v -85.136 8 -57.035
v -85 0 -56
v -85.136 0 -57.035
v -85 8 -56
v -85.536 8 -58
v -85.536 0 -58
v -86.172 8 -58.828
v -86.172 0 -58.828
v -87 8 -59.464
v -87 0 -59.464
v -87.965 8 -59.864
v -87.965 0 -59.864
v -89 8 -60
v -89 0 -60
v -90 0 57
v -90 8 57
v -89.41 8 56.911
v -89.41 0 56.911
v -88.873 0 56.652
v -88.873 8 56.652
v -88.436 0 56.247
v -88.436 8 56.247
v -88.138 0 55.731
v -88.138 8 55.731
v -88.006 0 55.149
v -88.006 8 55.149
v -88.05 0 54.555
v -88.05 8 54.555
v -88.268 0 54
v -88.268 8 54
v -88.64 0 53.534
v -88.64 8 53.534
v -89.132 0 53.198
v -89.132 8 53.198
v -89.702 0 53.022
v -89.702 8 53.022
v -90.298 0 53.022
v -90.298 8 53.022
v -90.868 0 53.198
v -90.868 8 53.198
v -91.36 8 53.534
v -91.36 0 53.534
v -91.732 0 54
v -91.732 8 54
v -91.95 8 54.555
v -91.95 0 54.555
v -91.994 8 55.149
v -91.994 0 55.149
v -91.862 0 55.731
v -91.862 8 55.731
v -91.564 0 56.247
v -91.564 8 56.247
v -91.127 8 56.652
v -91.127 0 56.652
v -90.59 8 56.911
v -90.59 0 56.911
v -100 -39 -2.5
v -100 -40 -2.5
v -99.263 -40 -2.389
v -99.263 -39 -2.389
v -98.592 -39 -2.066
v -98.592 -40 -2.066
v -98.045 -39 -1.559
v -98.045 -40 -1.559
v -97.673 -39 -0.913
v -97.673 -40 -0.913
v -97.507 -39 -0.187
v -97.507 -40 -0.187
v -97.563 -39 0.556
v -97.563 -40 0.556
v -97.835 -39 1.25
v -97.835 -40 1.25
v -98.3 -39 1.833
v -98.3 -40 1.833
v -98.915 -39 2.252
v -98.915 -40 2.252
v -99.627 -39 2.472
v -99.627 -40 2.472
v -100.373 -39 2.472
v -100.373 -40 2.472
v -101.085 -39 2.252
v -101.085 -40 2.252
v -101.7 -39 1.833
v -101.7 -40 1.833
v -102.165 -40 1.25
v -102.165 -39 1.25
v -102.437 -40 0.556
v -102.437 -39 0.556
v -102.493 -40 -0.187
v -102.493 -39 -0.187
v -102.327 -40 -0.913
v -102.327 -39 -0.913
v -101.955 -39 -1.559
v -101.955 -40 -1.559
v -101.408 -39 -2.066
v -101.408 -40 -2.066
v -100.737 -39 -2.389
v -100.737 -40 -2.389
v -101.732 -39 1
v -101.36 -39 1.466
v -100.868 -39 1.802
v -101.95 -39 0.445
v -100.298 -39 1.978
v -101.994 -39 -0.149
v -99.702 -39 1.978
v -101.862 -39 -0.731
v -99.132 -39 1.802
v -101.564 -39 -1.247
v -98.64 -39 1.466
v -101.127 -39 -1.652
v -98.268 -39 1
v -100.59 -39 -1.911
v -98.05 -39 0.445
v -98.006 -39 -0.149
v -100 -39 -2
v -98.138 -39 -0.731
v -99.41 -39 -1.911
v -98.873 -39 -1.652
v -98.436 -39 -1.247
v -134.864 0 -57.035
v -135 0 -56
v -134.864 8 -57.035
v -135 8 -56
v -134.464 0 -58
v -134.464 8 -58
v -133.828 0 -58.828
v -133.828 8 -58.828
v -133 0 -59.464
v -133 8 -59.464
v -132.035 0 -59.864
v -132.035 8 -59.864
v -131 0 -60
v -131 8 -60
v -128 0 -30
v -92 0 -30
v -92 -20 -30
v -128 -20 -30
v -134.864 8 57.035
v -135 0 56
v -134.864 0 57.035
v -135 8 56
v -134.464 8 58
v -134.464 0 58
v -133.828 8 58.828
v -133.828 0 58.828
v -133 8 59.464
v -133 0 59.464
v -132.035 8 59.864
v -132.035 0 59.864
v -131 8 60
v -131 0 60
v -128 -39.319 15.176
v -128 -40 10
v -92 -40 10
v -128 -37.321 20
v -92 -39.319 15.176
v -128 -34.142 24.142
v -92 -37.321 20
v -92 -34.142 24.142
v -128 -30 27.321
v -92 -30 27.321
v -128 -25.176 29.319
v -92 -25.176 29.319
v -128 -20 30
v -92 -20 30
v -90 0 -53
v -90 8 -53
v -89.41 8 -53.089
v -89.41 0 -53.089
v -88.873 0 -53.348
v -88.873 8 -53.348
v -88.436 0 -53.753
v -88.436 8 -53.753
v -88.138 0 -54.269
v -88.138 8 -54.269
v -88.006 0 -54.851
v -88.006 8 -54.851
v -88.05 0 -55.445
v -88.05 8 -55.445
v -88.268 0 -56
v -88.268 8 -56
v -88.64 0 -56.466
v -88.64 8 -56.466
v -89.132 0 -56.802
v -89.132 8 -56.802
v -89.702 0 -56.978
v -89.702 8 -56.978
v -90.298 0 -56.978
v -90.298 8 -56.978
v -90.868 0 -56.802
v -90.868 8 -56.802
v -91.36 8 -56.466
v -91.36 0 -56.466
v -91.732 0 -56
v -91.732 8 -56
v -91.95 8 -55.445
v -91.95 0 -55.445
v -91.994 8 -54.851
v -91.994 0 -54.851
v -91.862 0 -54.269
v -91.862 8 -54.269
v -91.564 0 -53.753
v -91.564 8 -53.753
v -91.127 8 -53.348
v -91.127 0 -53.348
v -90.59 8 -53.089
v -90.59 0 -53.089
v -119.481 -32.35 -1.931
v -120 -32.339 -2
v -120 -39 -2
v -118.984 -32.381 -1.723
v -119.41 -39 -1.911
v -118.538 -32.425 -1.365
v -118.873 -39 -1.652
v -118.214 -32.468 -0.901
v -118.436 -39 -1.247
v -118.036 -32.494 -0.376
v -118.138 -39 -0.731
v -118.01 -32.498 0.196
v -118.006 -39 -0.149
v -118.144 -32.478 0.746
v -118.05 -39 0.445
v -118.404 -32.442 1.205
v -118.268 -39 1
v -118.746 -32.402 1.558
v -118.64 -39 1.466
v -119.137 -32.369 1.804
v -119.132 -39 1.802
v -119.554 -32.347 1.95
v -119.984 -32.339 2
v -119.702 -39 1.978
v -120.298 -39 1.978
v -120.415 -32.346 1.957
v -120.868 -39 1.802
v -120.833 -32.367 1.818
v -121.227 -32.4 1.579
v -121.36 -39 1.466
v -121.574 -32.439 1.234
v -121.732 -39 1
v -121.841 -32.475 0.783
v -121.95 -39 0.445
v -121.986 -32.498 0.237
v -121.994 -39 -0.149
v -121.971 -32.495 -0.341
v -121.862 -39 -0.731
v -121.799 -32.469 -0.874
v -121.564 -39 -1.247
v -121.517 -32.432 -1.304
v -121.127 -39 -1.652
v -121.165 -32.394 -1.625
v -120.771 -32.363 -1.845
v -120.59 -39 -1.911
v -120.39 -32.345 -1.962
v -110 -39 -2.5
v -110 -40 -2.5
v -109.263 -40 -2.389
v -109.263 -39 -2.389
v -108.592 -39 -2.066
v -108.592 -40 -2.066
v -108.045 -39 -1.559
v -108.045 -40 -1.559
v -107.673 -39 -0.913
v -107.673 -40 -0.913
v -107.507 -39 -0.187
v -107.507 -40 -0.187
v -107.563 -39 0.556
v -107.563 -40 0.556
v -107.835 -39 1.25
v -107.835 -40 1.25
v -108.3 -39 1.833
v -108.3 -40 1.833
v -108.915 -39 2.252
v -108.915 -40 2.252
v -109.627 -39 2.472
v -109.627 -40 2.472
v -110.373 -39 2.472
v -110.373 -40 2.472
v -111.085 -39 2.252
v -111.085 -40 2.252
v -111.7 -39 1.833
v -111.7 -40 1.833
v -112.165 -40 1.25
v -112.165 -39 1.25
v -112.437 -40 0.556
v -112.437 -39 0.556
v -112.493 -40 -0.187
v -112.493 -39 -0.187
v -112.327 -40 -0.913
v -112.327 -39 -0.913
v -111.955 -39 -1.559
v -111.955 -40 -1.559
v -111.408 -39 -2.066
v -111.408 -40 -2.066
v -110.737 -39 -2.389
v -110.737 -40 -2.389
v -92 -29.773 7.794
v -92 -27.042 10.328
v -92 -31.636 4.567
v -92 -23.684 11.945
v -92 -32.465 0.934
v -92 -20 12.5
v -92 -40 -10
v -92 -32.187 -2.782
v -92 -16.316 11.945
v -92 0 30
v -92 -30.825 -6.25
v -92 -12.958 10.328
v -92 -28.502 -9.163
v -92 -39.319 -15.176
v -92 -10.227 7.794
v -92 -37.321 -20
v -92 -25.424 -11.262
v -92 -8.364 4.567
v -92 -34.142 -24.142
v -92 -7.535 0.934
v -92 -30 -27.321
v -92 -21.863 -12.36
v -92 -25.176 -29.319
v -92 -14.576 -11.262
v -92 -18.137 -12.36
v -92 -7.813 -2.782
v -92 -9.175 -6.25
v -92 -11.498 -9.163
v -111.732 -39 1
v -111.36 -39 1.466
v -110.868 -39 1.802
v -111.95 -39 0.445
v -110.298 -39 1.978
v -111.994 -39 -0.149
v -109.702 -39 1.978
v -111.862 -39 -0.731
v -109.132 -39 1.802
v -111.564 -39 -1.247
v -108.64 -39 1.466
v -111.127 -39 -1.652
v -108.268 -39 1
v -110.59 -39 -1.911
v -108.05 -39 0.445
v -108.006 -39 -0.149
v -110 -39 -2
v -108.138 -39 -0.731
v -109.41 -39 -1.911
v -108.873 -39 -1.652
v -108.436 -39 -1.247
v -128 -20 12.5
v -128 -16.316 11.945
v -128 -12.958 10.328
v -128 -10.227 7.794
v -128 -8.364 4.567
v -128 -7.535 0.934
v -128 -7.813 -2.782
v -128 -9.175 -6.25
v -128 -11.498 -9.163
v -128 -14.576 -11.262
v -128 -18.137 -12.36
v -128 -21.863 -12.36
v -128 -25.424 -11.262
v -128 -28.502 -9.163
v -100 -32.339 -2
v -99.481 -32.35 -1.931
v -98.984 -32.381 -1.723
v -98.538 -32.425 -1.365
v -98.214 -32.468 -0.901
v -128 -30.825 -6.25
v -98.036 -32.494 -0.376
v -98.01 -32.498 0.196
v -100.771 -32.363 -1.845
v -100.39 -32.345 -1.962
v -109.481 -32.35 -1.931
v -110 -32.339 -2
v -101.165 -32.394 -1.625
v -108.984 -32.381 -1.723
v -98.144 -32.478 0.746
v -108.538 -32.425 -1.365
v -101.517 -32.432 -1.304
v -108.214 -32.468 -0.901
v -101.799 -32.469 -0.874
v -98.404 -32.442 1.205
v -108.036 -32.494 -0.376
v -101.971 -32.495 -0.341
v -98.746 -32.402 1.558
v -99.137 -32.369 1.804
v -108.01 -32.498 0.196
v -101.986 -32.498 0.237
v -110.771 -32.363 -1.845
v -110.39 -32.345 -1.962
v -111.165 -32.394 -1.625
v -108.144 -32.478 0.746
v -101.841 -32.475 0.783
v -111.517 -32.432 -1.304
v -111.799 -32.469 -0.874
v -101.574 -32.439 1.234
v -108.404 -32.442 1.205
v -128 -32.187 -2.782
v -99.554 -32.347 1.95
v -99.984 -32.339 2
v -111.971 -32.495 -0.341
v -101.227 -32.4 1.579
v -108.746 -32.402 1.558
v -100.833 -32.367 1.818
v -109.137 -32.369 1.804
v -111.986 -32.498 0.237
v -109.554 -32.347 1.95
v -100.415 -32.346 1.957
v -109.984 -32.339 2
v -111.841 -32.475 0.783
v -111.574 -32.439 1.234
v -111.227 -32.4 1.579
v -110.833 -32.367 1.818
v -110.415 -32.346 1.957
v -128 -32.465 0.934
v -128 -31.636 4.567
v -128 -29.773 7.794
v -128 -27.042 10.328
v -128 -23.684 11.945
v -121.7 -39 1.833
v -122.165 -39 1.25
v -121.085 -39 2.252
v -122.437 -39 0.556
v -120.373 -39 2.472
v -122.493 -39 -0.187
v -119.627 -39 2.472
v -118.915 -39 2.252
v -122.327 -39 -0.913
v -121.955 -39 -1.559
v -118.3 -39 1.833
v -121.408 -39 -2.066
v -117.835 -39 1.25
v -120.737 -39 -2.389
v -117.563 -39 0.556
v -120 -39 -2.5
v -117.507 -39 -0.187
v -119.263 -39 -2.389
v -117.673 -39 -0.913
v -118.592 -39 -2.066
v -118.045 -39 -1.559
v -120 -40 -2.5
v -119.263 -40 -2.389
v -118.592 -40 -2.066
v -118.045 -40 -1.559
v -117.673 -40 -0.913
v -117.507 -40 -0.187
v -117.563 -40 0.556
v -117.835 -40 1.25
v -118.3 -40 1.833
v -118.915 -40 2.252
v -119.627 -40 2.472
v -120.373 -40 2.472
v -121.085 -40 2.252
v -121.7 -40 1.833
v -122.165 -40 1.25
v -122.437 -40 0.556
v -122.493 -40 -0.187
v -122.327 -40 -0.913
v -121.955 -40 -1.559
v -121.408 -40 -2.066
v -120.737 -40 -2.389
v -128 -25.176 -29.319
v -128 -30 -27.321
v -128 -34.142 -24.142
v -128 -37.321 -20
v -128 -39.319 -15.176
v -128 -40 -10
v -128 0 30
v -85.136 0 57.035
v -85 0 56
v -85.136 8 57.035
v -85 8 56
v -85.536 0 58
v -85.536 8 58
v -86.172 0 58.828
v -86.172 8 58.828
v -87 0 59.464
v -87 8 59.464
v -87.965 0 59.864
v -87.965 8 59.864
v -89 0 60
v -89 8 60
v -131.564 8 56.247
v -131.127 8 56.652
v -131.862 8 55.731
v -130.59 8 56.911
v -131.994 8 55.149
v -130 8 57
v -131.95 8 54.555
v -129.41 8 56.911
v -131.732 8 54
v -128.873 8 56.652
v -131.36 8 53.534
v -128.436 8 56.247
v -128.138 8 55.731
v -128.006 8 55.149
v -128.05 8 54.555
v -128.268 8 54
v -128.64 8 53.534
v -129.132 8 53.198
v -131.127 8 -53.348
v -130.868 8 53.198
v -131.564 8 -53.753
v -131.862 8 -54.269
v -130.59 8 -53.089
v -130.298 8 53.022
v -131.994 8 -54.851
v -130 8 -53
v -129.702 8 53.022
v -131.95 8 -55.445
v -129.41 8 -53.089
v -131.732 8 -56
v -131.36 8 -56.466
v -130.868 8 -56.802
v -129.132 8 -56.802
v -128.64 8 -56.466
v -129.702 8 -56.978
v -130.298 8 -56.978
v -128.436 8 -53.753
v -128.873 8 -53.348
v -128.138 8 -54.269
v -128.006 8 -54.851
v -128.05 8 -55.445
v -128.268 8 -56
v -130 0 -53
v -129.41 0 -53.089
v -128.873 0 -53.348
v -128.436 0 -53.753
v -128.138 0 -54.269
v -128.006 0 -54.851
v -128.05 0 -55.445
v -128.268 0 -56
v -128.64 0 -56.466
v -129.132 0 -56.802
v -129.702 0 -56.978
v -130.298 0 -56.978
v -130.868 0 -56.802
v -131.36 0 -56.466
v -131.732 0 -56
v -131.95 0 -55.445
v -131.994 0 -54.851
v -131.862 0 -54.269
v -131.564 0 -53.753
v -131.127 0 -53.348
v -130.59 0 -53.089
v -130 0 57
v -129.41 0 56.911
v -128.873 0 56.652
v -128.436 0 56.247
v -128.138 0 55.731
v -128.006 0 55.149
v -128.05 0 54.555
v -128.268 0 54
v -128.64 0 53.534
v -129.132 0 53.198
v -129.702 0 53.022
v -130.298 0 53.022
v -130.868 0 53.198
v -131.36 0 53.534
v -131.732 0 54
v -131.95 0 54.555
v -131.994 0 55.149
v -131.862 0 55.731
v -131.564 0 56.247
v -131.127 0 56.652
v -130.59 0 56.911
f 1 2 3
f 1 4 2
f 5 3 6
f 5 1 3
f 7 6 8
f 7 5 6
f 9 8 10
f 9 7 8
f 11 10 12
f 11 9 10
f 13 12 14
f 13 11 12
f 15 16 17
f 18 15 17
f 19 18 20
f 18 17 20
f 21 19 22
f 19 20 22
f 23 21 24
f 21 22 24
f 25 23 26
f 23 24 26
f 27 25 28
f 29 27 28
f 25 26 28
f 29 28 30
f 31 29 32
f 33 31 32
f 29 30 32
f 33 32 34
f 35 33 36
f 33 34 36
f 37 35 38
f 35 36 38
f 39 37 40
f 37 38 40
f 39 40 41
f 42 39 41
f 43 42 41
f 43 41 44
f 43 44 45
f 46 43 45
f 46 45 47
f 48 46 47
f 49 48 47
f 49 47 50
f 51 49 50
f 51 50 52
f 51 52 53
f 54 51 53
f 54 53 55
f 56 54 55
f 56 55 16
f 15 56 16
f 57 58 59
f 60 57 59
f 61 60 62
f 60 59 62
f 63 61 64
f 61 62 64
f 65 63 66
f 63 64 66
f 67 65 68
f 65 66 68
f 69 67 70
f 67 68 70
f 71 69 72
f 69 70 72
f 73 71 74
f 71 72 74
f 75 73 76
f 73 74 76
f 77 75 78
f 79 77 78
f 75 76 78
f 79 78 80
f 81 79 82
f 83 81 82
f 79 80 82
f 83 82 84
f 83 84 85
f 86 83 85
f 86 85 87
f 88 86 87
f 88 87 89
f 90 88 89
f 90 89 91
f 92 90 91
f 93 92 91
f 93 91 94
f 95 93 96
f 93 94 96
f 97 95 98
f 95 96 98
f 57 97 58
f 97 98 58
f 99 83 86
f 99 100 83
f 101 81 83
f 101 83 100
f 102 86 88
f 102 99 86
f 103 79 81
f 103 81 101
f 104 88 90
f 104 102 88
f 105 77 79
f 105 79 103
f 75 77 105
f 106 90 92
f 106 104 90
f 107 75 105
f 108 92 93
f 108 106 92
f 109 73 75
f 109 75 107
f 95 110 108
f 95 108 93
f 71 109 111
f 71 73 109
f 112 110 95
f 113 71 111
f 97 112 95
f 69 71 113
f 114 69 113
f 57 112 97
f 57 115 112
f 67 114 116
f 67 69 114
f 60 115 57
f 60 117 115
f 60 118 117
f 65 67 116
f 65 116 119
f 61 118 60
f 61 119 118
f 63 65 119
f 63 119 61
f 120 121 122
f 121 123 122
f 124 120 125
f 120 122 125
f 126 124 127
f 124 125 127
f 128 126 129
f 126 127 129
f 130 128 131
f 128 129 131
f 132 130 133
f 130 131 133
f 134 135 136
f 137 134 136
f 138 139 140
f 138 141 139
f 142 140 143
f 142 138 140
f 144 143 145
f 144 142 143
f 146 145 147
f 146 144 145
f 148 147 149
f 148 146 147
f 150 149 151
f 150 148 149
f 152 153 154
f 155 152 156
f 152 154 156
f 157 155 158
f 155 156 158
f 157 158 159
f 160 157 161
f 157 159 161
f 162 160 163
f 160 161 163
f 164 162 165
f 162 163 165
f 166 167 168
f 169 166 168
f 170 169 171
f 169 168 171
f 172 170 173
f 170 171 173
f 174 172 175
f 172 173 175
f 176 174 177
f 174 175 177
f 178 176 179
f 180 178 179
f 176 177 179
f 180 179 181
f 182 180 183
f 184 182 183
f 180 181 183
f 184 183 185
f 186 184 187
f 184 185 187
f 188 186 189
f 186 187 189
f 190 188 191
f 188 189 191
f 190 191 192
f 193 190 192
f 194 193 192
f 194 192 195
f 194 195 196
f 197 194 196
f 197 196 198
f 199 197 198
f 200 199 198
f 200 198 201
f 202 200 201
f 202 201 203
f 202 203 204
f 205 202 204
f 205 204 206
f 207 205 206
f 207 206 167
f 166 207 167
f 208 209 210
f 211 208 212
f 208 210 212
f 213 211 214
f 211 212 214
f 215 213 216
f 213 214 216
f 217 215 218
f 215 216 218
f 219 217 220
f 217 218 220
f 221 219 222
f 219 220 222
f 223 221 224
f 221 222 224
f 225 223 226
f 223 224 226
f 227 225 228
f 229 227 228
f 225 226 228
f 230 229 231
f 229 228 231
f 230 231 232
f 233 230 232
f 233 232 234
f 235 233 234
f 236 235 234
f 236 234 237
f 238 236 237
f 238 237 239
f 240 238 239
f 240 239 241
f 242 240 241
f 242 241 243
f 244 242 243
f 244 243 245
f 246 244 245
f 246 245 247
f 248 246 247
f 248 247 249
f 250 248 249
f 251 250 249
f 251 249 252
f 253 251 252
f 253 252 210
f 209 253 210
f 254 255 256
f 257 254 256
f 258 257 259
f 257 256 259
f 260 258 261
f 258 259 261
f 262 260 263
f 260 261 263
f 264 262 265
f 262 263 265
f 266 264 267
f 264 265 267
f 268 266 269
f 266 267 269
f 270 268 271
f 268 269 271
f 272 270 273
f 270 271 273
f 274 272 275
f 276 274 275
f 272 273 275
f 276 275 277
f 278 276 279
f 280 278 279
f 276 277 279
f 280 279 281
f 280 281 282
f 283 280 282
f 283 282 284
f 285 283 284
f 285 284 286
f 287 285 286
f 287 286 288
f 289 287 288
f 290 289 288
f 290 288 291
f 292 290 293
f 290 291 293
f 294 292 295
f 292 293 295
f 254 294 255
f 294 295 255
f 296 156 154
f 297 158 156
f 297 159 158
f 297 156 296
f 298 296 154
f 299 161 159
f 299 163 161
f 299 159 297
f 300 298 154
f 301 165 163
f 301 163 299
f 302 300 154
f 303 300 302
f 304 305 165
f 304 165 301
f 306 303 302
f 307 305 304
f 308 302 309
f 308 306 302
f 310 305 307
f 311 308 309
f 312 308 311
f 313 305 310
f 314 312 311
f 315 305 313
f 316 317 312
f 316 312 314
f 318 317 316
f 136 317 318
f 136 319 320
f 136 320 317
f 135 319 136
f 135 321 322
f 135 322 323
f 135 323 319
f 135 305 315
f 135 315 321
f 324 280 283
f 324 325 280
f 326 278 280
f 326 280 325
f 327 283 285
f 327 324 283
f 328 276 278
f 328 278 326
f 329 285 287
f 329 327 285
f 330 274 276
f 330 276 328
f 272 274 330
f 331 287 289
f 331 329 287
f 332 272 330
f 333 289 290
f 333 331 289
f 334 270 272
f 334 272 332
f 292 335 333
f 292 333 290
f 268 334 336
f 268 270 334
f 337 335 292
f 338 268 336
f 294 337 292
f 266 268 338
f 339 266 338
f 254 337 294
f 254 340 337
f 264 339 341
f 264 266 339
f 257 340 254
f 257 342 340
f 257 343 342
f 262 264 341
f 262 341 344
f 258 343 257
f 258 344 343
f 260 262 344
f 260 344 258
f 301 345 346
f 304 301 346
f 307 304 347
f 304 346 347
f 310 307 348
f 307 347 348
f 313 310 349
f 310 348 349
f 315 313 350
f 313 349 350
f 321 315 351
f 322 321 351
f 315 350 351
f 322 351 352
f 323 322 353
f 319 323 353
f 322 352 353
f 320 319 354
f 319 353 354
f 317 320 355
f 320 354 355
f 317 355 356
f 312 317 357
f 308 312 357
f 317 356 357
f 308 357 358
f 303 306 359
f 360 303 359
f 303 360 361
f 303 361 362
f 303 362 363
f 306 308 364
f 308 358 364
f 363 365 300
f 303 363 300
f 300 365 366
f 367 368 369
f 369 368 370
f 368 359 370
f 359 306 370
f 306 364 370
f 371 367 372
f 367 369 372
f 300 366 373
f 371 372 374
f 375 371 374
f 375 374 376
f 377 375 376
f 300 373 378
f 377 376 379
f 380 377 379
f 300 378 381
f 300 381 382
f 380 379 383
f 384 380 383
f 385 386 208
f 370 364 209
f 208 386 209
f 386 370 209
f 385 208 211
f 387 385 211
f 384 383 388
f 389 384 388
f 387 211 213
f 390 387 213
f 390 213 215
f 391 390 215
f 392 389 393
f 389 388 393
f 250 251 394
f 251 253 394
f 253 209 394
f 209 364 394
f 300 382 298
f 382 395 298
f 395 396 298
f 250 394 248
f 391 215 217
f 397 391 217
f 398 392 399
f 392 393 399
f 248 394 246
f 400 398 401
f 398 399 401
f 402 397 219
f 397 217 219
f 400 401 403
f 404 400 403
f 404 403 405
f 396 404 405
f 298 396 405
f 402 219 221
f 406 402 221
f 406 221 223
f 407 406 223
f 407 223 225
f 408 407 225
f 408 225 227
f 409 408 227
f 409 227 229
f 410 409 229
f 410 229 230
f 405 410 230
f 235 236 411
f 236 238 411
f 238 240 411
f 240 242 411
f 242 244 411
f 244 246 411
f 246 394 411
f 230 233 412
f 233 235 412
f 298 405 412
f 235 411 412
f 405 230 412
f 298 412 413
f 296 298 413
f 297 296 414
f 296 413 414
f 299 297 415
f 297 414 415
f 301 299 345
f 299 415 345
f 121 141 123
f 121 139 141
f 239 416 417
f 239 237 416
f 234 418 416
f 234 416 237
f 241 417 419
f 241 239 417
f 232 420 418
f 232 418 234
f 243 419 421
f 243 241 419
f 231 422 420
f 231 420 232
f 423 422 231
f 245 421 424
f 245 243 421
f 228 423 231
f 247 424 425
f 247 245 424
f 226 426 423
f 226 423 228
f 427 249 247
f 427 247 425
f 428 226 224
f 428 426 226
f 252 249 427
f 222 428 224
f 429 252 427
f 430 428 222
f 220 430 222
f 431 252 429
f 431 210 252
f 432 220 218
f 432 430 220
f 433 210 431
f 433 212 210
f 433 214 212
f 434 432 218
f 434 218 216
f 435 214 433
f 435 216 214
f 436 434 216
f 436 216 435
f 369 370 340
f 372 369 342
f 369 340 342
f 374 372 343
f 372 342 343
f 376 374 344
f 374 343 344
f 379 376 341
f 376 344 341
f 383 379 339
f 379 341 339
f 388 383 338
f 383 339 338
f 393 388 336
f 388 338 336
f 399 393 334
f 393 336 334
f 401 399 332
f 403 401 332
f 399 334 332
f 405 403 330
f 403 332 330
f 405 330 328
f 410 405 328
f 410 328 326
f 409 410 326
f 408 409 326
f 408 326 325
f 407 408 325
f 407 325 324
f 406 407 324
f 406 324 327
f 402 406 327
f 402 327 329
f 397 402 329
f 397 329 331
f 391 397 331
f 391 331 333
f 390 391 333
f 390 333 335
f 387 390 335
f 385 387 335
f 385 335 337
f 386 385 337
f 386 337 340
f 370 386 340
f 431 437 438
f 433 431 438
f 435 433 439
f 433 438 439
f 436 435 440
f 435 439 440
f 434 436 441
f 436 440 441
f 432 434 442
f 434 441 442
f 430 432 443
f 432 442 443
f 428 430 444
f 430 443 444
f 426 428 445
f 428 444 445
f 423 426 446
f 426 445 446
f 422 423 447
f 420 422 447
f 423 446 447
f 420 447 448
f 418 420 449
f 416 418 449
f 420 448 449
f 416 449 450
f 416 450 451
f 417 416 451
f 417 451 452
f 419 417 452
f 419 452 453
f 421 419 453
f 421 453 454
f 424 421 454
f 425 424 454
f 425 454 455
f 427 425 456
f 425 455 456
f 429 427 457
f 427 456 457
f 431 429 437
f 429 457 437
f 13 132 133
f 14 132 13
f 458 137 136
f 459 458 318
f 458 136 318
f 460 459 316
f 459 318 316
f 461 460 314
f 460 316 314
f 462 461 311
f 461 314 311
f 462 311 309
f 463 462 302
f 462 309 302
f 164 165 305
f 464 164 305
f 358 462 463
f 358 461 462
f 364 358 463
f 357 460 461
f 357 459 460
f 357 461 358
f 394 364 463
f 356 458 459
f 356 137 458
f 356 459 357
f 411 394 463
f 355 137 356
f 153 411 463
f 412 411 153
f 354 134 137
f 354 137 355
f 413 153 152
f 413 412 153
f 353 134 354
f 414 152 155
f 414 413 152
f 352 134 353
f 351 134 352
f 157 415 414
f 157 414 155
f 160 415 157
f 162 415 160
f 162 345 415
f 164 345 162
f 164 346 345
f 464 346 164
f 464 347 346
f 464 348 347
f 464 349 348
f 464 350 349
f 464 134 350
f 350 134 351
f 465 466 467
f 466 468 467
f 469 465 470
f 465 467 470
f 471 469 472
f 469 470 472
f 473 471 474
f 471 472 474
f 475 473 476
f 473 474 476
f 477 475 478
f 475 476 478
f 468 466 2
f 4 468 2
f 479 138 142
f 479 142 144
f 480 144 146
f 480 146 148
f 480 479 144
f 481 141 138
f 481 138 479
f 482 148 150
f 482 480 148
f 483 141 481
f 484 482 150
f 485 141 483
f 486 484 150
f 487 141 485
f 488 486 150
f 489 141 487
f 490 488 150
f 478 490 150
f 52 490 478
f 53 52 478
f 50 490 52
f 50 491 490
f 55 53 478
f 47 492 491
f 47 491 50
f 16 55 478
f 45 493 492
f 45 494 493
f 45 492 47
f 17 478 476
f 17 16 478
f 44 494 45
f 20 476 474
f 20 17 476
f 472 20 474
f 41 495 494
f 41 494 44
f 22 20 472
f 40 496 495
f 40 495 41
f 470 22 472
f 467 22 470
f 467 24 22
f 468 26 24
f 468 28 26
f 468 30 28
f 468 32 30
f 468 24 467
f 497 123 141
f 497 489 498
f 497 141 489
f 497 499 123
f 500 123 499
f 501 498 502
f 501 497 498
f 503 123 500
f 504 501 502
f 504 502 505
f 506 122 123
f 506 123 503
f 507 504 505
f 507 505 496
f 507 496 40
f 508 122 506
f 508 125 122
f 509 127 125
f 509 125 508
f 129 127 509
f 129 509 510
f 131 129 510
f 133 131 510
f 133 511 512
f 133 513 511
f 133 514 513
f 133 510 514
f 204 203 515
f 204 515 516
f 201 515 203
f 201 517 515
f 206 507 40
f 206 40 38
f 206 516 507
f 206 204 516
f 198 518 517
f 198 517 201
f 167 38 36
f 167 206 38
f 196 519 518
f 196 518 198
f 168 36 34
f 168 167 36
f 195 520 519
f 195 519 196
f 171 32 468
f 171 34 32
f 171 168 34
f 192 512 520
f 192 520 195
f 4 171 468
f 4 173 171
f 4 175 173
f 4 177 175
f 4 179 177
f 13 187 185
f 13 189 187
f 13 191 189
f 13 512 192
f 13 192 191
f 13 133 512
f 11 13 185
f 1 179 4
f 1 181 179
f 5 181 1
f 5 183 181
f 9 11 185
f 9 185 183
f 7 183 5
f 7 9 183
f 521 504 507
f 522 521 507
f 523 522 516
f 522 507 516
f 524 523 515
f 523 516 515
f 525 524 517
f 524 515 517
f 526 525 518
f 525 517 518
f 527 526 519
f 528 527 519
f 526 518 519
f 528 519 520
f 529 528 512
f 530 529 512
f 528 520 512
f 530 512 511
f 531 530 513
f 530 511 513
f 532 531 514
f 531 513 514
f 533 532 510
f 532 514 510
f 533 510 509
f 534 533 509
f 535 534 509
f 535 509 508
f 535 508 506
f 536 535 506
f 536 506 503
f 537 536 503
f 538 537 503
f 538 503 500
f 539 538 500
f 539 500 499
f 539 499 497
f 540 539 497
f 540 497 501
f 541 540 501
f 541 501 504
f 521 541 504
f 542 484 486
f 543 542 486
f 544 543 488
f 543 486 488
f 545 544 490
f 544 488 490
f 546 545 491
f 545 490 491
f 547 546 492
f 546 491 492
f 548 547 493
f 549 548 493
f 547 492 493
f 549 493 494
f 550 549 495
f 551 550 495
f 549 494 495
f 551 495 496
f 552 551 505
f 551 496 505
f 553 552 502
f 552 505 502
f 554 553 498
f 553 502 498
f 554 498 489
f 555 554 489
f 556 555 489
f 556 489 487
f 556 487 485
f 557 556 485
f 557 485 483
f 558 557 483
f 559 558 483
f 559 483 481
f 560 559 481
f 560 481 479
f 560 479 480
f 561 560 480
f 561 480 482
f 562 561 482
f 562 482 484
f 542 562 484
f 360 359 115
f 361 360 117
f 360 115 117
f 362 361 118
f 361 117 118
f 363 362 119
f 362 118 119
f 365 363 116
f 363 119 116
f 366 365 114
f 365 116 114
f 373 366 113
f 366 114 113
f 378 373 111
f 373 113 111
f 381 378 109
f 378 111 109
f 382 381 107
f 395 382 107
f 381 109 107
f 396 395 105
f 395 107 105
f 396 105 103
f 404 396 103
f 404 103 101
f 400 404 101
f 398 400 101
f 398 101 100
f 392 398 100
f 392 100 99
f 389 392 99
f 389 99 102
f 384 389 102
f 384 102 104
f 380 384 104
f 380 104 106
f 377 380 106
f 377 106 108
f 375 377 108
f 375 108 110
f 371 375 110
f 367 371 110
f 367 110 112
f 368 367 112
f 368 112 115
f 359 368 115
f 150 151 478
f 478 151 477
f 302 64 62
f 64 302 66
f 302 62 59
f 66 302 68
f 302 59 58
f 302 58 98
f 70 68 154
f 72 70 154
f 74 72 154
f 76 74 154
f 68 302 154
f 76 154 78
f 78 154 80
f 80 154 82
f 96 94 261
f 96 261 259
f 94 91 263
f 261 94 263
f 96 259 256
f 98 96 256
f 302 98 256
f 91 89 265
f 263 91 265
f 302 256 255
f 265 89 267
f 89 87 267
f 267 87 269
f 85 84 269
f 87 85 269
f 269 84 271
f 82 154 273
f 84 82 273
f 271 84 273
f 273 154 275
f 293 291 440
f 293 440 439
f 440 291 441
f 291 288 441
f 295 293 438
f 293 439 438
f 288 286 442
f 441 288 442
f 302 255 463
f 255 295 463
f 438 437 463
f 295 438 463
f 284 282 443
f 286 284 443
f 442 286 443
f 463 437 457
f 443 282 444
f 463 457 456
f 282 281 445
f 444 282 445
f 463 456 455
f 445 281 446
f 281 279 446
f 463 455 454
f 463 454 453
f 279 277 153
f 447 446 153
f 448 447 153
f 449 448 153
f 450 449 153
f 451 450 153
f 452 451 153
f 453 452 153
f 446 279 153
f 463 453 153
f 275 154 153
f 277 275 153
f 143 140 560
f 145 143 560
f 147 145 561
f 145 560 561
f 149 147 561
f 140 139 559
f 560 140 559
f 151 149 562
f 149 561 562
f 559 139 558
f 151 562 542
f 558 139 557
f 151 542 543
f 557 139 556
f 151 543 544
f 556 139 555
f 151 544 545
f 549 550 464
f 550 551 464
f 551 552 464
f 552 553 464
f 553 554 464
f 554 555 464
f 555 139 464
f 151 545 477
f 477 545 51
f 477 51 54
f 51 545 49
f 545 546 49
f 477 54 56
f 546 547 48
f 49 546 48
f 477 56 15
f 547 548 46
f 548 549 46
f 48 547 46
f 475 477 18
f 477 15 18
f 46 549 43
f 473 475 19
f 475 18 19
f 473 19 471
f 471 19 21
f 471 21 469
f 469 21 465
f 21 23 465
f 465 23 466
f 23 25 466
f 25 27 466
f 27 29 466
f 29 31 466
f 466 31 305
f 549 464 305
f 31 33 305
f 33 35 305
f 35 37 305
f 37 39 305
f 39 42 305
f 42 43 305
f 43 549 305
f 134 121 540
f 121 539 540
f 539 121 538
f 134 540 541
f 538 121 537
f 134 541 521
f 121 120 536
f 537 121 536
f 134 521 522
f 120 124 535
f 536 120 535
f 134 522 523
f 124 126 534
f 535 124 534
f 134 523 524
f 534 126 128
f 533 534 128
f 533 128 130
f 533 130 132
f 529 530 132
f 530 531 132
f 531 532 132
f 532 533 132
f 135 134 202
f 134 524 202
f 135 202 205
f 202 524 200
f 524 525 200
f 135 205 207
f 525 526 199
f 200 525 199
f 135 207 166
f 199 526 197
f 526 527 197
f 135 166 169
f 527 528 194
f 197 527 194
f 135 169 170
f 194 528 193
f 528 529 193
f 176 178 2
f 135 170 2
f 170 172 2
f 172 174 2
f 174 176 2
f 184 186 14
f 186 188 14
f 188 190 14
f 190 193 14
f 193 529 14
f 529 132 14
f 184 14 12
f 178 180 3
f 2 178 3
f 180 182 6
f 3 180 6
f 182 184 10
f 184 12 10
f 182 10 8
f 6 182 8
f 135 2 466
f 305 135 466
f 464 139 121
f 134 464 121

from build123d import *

# Parameters (mm, degrees)
SKETCH1_W                 = 50
SKETCH1_H                 = 120
BOSS_EXTRUDE1_DEPTH       = 8
SKETCH2_R                 = 2
CUT_EXTRUDE1_DEPTH        = 10
LPATTERN1_COUNT           = 2
LPATTERN1_PITCH           = 40
LPATTERN2_COUNT           = 2
LPATTERN2_PITCH           = 110
LPATTERN2_COPY_1_SKETCH_R = 2
LPATTERN2_COPY_1_DEPTH    = 10
BOSS_EXTRUDE2_DEPTH       = 40
SKETCH6_R                 = 12.5
CUT_EXTRUDE2_DEPTH        = 84.958322994
CUT_EXTRUDE3_DEPTH        = 84.958322994
FILLET1_R                 = 4
SKETCH8_R                 = 2
CUT_EXTRUDE4_DEPTH        = 10
SKETCH9_R                 = 2.5
CUT_EXTRUDE5_DEPTH        = 1
LPATTERN3_COUNT           = 2
LPATTERN3_PITCH           = 10
LPATTERN3_COL_COUNT       = 2
LPATTERN3_COL_PITCH       = 10


with BuildPart() as part:
    # Sketch1 → Boss-Extrude1 (new body)
    with BuildSketch(Plane(origin=(0, 0, 0), x_dir=(1, 0, 0), z_dir=(0, 1, 0))):
        with Locations((-110, 0)):
            Rectangle(SKETCH1_W, SKETCH1_H)
    extrude(amount=BOSS_EXTRUDE1_DEPTH)

    # Sketch2 → Cut-Extrude1 (cut)
    with BuildSketch(Plane(origin=(0, 8, 0), x_dir=(1, 0, 0), z_dir=(0, 1, 0))):
        with Locations(Location((-130, 55, 0), (0, 0, 270))):
            Circle(SKETCH2_R)
    cut_extrude1 = extrude(amount=-CUT_EXTRUDE1_DEPTH, mode=Mode.SUBTRACT)

    # LPattern1: Cut-Extrude1 ×2
    with Locations(*[(i * LPATTERN1_PITCH, 0, 0) for i in range(1, LPATTERN1_COUNT)]):
        add(cut_extrude1, mode=Mode.SUBTRACT)

    # LPattern2: Cut-Extrude1 ×2
    with Locations(*[(0, 0, i * LPATTERN2_PITCH) for i in range(1, LPATTERN2_COUNT)]):
        add(cut_extrude1, mode=Mode.SUBTRACT)

    # LPattern2 copy 1 sketch → LPattern2 copy 1 (cut)
    with BuildSketch(Plane(origin=(40, 8, 110), x_dir=(1, 0, 0), z_dir=(0, 1, 0))):
        with Locations(Location((-130, 55, 0), (0, 0, 270))):
            Circle(LPATTERN2_COPY_1_SKETCH_R)
    extrude(amount=-LPATTERN2_COPY_1_DEPTH, mode=Mode.SUBTRACT)

    # Sketch5 → Boss-Extrude2 (add)
    with BuildSketch(Plane.XZ):
        with BuildLine():
            Line((-92, 30), (-92, -30))
            ThreePointArc((-92, -30), (-110, -48), (-128, -30))
            Line((-128, -30), (-128, 30))
            ThreePointArc((-128, 30), (-110, 48), (-92, 30))
        make_face()
    extrude(amount=BOSS_EXTRUDE2_DEPTH)

    # Sketch6 → Cut-Extrude2 (cut, through all)
    with BuildSketch(Plane.ZY.offset(128)):
        with Locations((0, -20)):
            Circle(SKETCH6_R)
    extrude(amount=-CUT_EXTRUDE2_DEPTH, mode=Mode.SUBTRACT)

    # Sketch7 → Cut-Extrude3 (cut, through all)
    with BuildSketch(Plane(origin=(-92, 0, 0), x_dir=(0, 0, -1), z_dir=(1, 0, 0))):
        Polygon((-30, -20), (-30, 0), (-48, 0), (-48, -40), (-30, -40), align=None)
        with BuildLine():
            ThreePointArc((-10, -40), (-24.142135624, -34.142135624), (-30, -20))
            Line((-30, -20), (-30, -40))
            Line((-30, -40), (-10, -40))
        make_face()
        with BuildLine():
            ThreePointArc((30, -20), (24.142135624, -34.142135624), (10, -40))
            Line((10, -40), (30, -40))
            Line((30, -40), (30, -20))
        make_face()
        Polygon((30, -20), (30, -40), (48, -40), (48, 0), (30, 0), align=None)
    extrude(amount=-CUT_EXTRUDE3_DEPTH, mode=Mode.SUBTRACT)

    # Fillet1
    fillet1_edges = [part.edges().sort_by_distance(p)[0] for p in [
        (-85, 4, 60),
        (-135, 4, 60),
        (-135, 4, -60),
        (-85, 4, -60),
    ]]
    fillet(fillet1_edges, radius=FILLET1_R)

    # Sketch8 → Cut-Extrude4 (cut)
    with BuildSketch(Plane.XZ.offset(40)):
        with Locations(Location((-110, 0, 0), (0, 0, 270))):
            Circle(SKETCH8_R)
    cut_extrude4 = extrude(amount=-CUT_EXTRUDE4_DEPTH, mode=Mode.SUBTRACT)

    # Sketch9 → Cut-Extrude5 (cut)
    with BuildSketch(Plane.XZ.offset(40)):
        with Locations(Location((-110, 0, 0), (0, 0, 270))):
            Circle(SKETCH9_R)
    cut_extrude5 = extrude(amount=-CUT_EXTRUDE5_DEPTH, mode=Mode.SUBTRACT)

    # LPattern3: Cut-Extrude4, Cut-Extrude5 ×2
    with Locations(*[(i * LPATTERN3_PITCH, 0, 0) for i in range(1, LPATTERN3_COUNT)]):
        add(cut_extrude4, mode=Mode.SUBTRACT)
        add(cut_extrude5, mode=Mode.SUBTRACT)

    # LPattern3 col: Cut-Extrude4, Cut-Extrude5 ×2
    with Locations(*[(-i * LPATTERN3_COL_PITCH, 0, 0) for i in range(1, LPATTERN3_COL_COUNT)]):
        add(cut_extrude4, mode=Mode.SUBTRACT)
        add(cut_extrude5, mode=Mode.SUBTRACT)


solid = part.part
